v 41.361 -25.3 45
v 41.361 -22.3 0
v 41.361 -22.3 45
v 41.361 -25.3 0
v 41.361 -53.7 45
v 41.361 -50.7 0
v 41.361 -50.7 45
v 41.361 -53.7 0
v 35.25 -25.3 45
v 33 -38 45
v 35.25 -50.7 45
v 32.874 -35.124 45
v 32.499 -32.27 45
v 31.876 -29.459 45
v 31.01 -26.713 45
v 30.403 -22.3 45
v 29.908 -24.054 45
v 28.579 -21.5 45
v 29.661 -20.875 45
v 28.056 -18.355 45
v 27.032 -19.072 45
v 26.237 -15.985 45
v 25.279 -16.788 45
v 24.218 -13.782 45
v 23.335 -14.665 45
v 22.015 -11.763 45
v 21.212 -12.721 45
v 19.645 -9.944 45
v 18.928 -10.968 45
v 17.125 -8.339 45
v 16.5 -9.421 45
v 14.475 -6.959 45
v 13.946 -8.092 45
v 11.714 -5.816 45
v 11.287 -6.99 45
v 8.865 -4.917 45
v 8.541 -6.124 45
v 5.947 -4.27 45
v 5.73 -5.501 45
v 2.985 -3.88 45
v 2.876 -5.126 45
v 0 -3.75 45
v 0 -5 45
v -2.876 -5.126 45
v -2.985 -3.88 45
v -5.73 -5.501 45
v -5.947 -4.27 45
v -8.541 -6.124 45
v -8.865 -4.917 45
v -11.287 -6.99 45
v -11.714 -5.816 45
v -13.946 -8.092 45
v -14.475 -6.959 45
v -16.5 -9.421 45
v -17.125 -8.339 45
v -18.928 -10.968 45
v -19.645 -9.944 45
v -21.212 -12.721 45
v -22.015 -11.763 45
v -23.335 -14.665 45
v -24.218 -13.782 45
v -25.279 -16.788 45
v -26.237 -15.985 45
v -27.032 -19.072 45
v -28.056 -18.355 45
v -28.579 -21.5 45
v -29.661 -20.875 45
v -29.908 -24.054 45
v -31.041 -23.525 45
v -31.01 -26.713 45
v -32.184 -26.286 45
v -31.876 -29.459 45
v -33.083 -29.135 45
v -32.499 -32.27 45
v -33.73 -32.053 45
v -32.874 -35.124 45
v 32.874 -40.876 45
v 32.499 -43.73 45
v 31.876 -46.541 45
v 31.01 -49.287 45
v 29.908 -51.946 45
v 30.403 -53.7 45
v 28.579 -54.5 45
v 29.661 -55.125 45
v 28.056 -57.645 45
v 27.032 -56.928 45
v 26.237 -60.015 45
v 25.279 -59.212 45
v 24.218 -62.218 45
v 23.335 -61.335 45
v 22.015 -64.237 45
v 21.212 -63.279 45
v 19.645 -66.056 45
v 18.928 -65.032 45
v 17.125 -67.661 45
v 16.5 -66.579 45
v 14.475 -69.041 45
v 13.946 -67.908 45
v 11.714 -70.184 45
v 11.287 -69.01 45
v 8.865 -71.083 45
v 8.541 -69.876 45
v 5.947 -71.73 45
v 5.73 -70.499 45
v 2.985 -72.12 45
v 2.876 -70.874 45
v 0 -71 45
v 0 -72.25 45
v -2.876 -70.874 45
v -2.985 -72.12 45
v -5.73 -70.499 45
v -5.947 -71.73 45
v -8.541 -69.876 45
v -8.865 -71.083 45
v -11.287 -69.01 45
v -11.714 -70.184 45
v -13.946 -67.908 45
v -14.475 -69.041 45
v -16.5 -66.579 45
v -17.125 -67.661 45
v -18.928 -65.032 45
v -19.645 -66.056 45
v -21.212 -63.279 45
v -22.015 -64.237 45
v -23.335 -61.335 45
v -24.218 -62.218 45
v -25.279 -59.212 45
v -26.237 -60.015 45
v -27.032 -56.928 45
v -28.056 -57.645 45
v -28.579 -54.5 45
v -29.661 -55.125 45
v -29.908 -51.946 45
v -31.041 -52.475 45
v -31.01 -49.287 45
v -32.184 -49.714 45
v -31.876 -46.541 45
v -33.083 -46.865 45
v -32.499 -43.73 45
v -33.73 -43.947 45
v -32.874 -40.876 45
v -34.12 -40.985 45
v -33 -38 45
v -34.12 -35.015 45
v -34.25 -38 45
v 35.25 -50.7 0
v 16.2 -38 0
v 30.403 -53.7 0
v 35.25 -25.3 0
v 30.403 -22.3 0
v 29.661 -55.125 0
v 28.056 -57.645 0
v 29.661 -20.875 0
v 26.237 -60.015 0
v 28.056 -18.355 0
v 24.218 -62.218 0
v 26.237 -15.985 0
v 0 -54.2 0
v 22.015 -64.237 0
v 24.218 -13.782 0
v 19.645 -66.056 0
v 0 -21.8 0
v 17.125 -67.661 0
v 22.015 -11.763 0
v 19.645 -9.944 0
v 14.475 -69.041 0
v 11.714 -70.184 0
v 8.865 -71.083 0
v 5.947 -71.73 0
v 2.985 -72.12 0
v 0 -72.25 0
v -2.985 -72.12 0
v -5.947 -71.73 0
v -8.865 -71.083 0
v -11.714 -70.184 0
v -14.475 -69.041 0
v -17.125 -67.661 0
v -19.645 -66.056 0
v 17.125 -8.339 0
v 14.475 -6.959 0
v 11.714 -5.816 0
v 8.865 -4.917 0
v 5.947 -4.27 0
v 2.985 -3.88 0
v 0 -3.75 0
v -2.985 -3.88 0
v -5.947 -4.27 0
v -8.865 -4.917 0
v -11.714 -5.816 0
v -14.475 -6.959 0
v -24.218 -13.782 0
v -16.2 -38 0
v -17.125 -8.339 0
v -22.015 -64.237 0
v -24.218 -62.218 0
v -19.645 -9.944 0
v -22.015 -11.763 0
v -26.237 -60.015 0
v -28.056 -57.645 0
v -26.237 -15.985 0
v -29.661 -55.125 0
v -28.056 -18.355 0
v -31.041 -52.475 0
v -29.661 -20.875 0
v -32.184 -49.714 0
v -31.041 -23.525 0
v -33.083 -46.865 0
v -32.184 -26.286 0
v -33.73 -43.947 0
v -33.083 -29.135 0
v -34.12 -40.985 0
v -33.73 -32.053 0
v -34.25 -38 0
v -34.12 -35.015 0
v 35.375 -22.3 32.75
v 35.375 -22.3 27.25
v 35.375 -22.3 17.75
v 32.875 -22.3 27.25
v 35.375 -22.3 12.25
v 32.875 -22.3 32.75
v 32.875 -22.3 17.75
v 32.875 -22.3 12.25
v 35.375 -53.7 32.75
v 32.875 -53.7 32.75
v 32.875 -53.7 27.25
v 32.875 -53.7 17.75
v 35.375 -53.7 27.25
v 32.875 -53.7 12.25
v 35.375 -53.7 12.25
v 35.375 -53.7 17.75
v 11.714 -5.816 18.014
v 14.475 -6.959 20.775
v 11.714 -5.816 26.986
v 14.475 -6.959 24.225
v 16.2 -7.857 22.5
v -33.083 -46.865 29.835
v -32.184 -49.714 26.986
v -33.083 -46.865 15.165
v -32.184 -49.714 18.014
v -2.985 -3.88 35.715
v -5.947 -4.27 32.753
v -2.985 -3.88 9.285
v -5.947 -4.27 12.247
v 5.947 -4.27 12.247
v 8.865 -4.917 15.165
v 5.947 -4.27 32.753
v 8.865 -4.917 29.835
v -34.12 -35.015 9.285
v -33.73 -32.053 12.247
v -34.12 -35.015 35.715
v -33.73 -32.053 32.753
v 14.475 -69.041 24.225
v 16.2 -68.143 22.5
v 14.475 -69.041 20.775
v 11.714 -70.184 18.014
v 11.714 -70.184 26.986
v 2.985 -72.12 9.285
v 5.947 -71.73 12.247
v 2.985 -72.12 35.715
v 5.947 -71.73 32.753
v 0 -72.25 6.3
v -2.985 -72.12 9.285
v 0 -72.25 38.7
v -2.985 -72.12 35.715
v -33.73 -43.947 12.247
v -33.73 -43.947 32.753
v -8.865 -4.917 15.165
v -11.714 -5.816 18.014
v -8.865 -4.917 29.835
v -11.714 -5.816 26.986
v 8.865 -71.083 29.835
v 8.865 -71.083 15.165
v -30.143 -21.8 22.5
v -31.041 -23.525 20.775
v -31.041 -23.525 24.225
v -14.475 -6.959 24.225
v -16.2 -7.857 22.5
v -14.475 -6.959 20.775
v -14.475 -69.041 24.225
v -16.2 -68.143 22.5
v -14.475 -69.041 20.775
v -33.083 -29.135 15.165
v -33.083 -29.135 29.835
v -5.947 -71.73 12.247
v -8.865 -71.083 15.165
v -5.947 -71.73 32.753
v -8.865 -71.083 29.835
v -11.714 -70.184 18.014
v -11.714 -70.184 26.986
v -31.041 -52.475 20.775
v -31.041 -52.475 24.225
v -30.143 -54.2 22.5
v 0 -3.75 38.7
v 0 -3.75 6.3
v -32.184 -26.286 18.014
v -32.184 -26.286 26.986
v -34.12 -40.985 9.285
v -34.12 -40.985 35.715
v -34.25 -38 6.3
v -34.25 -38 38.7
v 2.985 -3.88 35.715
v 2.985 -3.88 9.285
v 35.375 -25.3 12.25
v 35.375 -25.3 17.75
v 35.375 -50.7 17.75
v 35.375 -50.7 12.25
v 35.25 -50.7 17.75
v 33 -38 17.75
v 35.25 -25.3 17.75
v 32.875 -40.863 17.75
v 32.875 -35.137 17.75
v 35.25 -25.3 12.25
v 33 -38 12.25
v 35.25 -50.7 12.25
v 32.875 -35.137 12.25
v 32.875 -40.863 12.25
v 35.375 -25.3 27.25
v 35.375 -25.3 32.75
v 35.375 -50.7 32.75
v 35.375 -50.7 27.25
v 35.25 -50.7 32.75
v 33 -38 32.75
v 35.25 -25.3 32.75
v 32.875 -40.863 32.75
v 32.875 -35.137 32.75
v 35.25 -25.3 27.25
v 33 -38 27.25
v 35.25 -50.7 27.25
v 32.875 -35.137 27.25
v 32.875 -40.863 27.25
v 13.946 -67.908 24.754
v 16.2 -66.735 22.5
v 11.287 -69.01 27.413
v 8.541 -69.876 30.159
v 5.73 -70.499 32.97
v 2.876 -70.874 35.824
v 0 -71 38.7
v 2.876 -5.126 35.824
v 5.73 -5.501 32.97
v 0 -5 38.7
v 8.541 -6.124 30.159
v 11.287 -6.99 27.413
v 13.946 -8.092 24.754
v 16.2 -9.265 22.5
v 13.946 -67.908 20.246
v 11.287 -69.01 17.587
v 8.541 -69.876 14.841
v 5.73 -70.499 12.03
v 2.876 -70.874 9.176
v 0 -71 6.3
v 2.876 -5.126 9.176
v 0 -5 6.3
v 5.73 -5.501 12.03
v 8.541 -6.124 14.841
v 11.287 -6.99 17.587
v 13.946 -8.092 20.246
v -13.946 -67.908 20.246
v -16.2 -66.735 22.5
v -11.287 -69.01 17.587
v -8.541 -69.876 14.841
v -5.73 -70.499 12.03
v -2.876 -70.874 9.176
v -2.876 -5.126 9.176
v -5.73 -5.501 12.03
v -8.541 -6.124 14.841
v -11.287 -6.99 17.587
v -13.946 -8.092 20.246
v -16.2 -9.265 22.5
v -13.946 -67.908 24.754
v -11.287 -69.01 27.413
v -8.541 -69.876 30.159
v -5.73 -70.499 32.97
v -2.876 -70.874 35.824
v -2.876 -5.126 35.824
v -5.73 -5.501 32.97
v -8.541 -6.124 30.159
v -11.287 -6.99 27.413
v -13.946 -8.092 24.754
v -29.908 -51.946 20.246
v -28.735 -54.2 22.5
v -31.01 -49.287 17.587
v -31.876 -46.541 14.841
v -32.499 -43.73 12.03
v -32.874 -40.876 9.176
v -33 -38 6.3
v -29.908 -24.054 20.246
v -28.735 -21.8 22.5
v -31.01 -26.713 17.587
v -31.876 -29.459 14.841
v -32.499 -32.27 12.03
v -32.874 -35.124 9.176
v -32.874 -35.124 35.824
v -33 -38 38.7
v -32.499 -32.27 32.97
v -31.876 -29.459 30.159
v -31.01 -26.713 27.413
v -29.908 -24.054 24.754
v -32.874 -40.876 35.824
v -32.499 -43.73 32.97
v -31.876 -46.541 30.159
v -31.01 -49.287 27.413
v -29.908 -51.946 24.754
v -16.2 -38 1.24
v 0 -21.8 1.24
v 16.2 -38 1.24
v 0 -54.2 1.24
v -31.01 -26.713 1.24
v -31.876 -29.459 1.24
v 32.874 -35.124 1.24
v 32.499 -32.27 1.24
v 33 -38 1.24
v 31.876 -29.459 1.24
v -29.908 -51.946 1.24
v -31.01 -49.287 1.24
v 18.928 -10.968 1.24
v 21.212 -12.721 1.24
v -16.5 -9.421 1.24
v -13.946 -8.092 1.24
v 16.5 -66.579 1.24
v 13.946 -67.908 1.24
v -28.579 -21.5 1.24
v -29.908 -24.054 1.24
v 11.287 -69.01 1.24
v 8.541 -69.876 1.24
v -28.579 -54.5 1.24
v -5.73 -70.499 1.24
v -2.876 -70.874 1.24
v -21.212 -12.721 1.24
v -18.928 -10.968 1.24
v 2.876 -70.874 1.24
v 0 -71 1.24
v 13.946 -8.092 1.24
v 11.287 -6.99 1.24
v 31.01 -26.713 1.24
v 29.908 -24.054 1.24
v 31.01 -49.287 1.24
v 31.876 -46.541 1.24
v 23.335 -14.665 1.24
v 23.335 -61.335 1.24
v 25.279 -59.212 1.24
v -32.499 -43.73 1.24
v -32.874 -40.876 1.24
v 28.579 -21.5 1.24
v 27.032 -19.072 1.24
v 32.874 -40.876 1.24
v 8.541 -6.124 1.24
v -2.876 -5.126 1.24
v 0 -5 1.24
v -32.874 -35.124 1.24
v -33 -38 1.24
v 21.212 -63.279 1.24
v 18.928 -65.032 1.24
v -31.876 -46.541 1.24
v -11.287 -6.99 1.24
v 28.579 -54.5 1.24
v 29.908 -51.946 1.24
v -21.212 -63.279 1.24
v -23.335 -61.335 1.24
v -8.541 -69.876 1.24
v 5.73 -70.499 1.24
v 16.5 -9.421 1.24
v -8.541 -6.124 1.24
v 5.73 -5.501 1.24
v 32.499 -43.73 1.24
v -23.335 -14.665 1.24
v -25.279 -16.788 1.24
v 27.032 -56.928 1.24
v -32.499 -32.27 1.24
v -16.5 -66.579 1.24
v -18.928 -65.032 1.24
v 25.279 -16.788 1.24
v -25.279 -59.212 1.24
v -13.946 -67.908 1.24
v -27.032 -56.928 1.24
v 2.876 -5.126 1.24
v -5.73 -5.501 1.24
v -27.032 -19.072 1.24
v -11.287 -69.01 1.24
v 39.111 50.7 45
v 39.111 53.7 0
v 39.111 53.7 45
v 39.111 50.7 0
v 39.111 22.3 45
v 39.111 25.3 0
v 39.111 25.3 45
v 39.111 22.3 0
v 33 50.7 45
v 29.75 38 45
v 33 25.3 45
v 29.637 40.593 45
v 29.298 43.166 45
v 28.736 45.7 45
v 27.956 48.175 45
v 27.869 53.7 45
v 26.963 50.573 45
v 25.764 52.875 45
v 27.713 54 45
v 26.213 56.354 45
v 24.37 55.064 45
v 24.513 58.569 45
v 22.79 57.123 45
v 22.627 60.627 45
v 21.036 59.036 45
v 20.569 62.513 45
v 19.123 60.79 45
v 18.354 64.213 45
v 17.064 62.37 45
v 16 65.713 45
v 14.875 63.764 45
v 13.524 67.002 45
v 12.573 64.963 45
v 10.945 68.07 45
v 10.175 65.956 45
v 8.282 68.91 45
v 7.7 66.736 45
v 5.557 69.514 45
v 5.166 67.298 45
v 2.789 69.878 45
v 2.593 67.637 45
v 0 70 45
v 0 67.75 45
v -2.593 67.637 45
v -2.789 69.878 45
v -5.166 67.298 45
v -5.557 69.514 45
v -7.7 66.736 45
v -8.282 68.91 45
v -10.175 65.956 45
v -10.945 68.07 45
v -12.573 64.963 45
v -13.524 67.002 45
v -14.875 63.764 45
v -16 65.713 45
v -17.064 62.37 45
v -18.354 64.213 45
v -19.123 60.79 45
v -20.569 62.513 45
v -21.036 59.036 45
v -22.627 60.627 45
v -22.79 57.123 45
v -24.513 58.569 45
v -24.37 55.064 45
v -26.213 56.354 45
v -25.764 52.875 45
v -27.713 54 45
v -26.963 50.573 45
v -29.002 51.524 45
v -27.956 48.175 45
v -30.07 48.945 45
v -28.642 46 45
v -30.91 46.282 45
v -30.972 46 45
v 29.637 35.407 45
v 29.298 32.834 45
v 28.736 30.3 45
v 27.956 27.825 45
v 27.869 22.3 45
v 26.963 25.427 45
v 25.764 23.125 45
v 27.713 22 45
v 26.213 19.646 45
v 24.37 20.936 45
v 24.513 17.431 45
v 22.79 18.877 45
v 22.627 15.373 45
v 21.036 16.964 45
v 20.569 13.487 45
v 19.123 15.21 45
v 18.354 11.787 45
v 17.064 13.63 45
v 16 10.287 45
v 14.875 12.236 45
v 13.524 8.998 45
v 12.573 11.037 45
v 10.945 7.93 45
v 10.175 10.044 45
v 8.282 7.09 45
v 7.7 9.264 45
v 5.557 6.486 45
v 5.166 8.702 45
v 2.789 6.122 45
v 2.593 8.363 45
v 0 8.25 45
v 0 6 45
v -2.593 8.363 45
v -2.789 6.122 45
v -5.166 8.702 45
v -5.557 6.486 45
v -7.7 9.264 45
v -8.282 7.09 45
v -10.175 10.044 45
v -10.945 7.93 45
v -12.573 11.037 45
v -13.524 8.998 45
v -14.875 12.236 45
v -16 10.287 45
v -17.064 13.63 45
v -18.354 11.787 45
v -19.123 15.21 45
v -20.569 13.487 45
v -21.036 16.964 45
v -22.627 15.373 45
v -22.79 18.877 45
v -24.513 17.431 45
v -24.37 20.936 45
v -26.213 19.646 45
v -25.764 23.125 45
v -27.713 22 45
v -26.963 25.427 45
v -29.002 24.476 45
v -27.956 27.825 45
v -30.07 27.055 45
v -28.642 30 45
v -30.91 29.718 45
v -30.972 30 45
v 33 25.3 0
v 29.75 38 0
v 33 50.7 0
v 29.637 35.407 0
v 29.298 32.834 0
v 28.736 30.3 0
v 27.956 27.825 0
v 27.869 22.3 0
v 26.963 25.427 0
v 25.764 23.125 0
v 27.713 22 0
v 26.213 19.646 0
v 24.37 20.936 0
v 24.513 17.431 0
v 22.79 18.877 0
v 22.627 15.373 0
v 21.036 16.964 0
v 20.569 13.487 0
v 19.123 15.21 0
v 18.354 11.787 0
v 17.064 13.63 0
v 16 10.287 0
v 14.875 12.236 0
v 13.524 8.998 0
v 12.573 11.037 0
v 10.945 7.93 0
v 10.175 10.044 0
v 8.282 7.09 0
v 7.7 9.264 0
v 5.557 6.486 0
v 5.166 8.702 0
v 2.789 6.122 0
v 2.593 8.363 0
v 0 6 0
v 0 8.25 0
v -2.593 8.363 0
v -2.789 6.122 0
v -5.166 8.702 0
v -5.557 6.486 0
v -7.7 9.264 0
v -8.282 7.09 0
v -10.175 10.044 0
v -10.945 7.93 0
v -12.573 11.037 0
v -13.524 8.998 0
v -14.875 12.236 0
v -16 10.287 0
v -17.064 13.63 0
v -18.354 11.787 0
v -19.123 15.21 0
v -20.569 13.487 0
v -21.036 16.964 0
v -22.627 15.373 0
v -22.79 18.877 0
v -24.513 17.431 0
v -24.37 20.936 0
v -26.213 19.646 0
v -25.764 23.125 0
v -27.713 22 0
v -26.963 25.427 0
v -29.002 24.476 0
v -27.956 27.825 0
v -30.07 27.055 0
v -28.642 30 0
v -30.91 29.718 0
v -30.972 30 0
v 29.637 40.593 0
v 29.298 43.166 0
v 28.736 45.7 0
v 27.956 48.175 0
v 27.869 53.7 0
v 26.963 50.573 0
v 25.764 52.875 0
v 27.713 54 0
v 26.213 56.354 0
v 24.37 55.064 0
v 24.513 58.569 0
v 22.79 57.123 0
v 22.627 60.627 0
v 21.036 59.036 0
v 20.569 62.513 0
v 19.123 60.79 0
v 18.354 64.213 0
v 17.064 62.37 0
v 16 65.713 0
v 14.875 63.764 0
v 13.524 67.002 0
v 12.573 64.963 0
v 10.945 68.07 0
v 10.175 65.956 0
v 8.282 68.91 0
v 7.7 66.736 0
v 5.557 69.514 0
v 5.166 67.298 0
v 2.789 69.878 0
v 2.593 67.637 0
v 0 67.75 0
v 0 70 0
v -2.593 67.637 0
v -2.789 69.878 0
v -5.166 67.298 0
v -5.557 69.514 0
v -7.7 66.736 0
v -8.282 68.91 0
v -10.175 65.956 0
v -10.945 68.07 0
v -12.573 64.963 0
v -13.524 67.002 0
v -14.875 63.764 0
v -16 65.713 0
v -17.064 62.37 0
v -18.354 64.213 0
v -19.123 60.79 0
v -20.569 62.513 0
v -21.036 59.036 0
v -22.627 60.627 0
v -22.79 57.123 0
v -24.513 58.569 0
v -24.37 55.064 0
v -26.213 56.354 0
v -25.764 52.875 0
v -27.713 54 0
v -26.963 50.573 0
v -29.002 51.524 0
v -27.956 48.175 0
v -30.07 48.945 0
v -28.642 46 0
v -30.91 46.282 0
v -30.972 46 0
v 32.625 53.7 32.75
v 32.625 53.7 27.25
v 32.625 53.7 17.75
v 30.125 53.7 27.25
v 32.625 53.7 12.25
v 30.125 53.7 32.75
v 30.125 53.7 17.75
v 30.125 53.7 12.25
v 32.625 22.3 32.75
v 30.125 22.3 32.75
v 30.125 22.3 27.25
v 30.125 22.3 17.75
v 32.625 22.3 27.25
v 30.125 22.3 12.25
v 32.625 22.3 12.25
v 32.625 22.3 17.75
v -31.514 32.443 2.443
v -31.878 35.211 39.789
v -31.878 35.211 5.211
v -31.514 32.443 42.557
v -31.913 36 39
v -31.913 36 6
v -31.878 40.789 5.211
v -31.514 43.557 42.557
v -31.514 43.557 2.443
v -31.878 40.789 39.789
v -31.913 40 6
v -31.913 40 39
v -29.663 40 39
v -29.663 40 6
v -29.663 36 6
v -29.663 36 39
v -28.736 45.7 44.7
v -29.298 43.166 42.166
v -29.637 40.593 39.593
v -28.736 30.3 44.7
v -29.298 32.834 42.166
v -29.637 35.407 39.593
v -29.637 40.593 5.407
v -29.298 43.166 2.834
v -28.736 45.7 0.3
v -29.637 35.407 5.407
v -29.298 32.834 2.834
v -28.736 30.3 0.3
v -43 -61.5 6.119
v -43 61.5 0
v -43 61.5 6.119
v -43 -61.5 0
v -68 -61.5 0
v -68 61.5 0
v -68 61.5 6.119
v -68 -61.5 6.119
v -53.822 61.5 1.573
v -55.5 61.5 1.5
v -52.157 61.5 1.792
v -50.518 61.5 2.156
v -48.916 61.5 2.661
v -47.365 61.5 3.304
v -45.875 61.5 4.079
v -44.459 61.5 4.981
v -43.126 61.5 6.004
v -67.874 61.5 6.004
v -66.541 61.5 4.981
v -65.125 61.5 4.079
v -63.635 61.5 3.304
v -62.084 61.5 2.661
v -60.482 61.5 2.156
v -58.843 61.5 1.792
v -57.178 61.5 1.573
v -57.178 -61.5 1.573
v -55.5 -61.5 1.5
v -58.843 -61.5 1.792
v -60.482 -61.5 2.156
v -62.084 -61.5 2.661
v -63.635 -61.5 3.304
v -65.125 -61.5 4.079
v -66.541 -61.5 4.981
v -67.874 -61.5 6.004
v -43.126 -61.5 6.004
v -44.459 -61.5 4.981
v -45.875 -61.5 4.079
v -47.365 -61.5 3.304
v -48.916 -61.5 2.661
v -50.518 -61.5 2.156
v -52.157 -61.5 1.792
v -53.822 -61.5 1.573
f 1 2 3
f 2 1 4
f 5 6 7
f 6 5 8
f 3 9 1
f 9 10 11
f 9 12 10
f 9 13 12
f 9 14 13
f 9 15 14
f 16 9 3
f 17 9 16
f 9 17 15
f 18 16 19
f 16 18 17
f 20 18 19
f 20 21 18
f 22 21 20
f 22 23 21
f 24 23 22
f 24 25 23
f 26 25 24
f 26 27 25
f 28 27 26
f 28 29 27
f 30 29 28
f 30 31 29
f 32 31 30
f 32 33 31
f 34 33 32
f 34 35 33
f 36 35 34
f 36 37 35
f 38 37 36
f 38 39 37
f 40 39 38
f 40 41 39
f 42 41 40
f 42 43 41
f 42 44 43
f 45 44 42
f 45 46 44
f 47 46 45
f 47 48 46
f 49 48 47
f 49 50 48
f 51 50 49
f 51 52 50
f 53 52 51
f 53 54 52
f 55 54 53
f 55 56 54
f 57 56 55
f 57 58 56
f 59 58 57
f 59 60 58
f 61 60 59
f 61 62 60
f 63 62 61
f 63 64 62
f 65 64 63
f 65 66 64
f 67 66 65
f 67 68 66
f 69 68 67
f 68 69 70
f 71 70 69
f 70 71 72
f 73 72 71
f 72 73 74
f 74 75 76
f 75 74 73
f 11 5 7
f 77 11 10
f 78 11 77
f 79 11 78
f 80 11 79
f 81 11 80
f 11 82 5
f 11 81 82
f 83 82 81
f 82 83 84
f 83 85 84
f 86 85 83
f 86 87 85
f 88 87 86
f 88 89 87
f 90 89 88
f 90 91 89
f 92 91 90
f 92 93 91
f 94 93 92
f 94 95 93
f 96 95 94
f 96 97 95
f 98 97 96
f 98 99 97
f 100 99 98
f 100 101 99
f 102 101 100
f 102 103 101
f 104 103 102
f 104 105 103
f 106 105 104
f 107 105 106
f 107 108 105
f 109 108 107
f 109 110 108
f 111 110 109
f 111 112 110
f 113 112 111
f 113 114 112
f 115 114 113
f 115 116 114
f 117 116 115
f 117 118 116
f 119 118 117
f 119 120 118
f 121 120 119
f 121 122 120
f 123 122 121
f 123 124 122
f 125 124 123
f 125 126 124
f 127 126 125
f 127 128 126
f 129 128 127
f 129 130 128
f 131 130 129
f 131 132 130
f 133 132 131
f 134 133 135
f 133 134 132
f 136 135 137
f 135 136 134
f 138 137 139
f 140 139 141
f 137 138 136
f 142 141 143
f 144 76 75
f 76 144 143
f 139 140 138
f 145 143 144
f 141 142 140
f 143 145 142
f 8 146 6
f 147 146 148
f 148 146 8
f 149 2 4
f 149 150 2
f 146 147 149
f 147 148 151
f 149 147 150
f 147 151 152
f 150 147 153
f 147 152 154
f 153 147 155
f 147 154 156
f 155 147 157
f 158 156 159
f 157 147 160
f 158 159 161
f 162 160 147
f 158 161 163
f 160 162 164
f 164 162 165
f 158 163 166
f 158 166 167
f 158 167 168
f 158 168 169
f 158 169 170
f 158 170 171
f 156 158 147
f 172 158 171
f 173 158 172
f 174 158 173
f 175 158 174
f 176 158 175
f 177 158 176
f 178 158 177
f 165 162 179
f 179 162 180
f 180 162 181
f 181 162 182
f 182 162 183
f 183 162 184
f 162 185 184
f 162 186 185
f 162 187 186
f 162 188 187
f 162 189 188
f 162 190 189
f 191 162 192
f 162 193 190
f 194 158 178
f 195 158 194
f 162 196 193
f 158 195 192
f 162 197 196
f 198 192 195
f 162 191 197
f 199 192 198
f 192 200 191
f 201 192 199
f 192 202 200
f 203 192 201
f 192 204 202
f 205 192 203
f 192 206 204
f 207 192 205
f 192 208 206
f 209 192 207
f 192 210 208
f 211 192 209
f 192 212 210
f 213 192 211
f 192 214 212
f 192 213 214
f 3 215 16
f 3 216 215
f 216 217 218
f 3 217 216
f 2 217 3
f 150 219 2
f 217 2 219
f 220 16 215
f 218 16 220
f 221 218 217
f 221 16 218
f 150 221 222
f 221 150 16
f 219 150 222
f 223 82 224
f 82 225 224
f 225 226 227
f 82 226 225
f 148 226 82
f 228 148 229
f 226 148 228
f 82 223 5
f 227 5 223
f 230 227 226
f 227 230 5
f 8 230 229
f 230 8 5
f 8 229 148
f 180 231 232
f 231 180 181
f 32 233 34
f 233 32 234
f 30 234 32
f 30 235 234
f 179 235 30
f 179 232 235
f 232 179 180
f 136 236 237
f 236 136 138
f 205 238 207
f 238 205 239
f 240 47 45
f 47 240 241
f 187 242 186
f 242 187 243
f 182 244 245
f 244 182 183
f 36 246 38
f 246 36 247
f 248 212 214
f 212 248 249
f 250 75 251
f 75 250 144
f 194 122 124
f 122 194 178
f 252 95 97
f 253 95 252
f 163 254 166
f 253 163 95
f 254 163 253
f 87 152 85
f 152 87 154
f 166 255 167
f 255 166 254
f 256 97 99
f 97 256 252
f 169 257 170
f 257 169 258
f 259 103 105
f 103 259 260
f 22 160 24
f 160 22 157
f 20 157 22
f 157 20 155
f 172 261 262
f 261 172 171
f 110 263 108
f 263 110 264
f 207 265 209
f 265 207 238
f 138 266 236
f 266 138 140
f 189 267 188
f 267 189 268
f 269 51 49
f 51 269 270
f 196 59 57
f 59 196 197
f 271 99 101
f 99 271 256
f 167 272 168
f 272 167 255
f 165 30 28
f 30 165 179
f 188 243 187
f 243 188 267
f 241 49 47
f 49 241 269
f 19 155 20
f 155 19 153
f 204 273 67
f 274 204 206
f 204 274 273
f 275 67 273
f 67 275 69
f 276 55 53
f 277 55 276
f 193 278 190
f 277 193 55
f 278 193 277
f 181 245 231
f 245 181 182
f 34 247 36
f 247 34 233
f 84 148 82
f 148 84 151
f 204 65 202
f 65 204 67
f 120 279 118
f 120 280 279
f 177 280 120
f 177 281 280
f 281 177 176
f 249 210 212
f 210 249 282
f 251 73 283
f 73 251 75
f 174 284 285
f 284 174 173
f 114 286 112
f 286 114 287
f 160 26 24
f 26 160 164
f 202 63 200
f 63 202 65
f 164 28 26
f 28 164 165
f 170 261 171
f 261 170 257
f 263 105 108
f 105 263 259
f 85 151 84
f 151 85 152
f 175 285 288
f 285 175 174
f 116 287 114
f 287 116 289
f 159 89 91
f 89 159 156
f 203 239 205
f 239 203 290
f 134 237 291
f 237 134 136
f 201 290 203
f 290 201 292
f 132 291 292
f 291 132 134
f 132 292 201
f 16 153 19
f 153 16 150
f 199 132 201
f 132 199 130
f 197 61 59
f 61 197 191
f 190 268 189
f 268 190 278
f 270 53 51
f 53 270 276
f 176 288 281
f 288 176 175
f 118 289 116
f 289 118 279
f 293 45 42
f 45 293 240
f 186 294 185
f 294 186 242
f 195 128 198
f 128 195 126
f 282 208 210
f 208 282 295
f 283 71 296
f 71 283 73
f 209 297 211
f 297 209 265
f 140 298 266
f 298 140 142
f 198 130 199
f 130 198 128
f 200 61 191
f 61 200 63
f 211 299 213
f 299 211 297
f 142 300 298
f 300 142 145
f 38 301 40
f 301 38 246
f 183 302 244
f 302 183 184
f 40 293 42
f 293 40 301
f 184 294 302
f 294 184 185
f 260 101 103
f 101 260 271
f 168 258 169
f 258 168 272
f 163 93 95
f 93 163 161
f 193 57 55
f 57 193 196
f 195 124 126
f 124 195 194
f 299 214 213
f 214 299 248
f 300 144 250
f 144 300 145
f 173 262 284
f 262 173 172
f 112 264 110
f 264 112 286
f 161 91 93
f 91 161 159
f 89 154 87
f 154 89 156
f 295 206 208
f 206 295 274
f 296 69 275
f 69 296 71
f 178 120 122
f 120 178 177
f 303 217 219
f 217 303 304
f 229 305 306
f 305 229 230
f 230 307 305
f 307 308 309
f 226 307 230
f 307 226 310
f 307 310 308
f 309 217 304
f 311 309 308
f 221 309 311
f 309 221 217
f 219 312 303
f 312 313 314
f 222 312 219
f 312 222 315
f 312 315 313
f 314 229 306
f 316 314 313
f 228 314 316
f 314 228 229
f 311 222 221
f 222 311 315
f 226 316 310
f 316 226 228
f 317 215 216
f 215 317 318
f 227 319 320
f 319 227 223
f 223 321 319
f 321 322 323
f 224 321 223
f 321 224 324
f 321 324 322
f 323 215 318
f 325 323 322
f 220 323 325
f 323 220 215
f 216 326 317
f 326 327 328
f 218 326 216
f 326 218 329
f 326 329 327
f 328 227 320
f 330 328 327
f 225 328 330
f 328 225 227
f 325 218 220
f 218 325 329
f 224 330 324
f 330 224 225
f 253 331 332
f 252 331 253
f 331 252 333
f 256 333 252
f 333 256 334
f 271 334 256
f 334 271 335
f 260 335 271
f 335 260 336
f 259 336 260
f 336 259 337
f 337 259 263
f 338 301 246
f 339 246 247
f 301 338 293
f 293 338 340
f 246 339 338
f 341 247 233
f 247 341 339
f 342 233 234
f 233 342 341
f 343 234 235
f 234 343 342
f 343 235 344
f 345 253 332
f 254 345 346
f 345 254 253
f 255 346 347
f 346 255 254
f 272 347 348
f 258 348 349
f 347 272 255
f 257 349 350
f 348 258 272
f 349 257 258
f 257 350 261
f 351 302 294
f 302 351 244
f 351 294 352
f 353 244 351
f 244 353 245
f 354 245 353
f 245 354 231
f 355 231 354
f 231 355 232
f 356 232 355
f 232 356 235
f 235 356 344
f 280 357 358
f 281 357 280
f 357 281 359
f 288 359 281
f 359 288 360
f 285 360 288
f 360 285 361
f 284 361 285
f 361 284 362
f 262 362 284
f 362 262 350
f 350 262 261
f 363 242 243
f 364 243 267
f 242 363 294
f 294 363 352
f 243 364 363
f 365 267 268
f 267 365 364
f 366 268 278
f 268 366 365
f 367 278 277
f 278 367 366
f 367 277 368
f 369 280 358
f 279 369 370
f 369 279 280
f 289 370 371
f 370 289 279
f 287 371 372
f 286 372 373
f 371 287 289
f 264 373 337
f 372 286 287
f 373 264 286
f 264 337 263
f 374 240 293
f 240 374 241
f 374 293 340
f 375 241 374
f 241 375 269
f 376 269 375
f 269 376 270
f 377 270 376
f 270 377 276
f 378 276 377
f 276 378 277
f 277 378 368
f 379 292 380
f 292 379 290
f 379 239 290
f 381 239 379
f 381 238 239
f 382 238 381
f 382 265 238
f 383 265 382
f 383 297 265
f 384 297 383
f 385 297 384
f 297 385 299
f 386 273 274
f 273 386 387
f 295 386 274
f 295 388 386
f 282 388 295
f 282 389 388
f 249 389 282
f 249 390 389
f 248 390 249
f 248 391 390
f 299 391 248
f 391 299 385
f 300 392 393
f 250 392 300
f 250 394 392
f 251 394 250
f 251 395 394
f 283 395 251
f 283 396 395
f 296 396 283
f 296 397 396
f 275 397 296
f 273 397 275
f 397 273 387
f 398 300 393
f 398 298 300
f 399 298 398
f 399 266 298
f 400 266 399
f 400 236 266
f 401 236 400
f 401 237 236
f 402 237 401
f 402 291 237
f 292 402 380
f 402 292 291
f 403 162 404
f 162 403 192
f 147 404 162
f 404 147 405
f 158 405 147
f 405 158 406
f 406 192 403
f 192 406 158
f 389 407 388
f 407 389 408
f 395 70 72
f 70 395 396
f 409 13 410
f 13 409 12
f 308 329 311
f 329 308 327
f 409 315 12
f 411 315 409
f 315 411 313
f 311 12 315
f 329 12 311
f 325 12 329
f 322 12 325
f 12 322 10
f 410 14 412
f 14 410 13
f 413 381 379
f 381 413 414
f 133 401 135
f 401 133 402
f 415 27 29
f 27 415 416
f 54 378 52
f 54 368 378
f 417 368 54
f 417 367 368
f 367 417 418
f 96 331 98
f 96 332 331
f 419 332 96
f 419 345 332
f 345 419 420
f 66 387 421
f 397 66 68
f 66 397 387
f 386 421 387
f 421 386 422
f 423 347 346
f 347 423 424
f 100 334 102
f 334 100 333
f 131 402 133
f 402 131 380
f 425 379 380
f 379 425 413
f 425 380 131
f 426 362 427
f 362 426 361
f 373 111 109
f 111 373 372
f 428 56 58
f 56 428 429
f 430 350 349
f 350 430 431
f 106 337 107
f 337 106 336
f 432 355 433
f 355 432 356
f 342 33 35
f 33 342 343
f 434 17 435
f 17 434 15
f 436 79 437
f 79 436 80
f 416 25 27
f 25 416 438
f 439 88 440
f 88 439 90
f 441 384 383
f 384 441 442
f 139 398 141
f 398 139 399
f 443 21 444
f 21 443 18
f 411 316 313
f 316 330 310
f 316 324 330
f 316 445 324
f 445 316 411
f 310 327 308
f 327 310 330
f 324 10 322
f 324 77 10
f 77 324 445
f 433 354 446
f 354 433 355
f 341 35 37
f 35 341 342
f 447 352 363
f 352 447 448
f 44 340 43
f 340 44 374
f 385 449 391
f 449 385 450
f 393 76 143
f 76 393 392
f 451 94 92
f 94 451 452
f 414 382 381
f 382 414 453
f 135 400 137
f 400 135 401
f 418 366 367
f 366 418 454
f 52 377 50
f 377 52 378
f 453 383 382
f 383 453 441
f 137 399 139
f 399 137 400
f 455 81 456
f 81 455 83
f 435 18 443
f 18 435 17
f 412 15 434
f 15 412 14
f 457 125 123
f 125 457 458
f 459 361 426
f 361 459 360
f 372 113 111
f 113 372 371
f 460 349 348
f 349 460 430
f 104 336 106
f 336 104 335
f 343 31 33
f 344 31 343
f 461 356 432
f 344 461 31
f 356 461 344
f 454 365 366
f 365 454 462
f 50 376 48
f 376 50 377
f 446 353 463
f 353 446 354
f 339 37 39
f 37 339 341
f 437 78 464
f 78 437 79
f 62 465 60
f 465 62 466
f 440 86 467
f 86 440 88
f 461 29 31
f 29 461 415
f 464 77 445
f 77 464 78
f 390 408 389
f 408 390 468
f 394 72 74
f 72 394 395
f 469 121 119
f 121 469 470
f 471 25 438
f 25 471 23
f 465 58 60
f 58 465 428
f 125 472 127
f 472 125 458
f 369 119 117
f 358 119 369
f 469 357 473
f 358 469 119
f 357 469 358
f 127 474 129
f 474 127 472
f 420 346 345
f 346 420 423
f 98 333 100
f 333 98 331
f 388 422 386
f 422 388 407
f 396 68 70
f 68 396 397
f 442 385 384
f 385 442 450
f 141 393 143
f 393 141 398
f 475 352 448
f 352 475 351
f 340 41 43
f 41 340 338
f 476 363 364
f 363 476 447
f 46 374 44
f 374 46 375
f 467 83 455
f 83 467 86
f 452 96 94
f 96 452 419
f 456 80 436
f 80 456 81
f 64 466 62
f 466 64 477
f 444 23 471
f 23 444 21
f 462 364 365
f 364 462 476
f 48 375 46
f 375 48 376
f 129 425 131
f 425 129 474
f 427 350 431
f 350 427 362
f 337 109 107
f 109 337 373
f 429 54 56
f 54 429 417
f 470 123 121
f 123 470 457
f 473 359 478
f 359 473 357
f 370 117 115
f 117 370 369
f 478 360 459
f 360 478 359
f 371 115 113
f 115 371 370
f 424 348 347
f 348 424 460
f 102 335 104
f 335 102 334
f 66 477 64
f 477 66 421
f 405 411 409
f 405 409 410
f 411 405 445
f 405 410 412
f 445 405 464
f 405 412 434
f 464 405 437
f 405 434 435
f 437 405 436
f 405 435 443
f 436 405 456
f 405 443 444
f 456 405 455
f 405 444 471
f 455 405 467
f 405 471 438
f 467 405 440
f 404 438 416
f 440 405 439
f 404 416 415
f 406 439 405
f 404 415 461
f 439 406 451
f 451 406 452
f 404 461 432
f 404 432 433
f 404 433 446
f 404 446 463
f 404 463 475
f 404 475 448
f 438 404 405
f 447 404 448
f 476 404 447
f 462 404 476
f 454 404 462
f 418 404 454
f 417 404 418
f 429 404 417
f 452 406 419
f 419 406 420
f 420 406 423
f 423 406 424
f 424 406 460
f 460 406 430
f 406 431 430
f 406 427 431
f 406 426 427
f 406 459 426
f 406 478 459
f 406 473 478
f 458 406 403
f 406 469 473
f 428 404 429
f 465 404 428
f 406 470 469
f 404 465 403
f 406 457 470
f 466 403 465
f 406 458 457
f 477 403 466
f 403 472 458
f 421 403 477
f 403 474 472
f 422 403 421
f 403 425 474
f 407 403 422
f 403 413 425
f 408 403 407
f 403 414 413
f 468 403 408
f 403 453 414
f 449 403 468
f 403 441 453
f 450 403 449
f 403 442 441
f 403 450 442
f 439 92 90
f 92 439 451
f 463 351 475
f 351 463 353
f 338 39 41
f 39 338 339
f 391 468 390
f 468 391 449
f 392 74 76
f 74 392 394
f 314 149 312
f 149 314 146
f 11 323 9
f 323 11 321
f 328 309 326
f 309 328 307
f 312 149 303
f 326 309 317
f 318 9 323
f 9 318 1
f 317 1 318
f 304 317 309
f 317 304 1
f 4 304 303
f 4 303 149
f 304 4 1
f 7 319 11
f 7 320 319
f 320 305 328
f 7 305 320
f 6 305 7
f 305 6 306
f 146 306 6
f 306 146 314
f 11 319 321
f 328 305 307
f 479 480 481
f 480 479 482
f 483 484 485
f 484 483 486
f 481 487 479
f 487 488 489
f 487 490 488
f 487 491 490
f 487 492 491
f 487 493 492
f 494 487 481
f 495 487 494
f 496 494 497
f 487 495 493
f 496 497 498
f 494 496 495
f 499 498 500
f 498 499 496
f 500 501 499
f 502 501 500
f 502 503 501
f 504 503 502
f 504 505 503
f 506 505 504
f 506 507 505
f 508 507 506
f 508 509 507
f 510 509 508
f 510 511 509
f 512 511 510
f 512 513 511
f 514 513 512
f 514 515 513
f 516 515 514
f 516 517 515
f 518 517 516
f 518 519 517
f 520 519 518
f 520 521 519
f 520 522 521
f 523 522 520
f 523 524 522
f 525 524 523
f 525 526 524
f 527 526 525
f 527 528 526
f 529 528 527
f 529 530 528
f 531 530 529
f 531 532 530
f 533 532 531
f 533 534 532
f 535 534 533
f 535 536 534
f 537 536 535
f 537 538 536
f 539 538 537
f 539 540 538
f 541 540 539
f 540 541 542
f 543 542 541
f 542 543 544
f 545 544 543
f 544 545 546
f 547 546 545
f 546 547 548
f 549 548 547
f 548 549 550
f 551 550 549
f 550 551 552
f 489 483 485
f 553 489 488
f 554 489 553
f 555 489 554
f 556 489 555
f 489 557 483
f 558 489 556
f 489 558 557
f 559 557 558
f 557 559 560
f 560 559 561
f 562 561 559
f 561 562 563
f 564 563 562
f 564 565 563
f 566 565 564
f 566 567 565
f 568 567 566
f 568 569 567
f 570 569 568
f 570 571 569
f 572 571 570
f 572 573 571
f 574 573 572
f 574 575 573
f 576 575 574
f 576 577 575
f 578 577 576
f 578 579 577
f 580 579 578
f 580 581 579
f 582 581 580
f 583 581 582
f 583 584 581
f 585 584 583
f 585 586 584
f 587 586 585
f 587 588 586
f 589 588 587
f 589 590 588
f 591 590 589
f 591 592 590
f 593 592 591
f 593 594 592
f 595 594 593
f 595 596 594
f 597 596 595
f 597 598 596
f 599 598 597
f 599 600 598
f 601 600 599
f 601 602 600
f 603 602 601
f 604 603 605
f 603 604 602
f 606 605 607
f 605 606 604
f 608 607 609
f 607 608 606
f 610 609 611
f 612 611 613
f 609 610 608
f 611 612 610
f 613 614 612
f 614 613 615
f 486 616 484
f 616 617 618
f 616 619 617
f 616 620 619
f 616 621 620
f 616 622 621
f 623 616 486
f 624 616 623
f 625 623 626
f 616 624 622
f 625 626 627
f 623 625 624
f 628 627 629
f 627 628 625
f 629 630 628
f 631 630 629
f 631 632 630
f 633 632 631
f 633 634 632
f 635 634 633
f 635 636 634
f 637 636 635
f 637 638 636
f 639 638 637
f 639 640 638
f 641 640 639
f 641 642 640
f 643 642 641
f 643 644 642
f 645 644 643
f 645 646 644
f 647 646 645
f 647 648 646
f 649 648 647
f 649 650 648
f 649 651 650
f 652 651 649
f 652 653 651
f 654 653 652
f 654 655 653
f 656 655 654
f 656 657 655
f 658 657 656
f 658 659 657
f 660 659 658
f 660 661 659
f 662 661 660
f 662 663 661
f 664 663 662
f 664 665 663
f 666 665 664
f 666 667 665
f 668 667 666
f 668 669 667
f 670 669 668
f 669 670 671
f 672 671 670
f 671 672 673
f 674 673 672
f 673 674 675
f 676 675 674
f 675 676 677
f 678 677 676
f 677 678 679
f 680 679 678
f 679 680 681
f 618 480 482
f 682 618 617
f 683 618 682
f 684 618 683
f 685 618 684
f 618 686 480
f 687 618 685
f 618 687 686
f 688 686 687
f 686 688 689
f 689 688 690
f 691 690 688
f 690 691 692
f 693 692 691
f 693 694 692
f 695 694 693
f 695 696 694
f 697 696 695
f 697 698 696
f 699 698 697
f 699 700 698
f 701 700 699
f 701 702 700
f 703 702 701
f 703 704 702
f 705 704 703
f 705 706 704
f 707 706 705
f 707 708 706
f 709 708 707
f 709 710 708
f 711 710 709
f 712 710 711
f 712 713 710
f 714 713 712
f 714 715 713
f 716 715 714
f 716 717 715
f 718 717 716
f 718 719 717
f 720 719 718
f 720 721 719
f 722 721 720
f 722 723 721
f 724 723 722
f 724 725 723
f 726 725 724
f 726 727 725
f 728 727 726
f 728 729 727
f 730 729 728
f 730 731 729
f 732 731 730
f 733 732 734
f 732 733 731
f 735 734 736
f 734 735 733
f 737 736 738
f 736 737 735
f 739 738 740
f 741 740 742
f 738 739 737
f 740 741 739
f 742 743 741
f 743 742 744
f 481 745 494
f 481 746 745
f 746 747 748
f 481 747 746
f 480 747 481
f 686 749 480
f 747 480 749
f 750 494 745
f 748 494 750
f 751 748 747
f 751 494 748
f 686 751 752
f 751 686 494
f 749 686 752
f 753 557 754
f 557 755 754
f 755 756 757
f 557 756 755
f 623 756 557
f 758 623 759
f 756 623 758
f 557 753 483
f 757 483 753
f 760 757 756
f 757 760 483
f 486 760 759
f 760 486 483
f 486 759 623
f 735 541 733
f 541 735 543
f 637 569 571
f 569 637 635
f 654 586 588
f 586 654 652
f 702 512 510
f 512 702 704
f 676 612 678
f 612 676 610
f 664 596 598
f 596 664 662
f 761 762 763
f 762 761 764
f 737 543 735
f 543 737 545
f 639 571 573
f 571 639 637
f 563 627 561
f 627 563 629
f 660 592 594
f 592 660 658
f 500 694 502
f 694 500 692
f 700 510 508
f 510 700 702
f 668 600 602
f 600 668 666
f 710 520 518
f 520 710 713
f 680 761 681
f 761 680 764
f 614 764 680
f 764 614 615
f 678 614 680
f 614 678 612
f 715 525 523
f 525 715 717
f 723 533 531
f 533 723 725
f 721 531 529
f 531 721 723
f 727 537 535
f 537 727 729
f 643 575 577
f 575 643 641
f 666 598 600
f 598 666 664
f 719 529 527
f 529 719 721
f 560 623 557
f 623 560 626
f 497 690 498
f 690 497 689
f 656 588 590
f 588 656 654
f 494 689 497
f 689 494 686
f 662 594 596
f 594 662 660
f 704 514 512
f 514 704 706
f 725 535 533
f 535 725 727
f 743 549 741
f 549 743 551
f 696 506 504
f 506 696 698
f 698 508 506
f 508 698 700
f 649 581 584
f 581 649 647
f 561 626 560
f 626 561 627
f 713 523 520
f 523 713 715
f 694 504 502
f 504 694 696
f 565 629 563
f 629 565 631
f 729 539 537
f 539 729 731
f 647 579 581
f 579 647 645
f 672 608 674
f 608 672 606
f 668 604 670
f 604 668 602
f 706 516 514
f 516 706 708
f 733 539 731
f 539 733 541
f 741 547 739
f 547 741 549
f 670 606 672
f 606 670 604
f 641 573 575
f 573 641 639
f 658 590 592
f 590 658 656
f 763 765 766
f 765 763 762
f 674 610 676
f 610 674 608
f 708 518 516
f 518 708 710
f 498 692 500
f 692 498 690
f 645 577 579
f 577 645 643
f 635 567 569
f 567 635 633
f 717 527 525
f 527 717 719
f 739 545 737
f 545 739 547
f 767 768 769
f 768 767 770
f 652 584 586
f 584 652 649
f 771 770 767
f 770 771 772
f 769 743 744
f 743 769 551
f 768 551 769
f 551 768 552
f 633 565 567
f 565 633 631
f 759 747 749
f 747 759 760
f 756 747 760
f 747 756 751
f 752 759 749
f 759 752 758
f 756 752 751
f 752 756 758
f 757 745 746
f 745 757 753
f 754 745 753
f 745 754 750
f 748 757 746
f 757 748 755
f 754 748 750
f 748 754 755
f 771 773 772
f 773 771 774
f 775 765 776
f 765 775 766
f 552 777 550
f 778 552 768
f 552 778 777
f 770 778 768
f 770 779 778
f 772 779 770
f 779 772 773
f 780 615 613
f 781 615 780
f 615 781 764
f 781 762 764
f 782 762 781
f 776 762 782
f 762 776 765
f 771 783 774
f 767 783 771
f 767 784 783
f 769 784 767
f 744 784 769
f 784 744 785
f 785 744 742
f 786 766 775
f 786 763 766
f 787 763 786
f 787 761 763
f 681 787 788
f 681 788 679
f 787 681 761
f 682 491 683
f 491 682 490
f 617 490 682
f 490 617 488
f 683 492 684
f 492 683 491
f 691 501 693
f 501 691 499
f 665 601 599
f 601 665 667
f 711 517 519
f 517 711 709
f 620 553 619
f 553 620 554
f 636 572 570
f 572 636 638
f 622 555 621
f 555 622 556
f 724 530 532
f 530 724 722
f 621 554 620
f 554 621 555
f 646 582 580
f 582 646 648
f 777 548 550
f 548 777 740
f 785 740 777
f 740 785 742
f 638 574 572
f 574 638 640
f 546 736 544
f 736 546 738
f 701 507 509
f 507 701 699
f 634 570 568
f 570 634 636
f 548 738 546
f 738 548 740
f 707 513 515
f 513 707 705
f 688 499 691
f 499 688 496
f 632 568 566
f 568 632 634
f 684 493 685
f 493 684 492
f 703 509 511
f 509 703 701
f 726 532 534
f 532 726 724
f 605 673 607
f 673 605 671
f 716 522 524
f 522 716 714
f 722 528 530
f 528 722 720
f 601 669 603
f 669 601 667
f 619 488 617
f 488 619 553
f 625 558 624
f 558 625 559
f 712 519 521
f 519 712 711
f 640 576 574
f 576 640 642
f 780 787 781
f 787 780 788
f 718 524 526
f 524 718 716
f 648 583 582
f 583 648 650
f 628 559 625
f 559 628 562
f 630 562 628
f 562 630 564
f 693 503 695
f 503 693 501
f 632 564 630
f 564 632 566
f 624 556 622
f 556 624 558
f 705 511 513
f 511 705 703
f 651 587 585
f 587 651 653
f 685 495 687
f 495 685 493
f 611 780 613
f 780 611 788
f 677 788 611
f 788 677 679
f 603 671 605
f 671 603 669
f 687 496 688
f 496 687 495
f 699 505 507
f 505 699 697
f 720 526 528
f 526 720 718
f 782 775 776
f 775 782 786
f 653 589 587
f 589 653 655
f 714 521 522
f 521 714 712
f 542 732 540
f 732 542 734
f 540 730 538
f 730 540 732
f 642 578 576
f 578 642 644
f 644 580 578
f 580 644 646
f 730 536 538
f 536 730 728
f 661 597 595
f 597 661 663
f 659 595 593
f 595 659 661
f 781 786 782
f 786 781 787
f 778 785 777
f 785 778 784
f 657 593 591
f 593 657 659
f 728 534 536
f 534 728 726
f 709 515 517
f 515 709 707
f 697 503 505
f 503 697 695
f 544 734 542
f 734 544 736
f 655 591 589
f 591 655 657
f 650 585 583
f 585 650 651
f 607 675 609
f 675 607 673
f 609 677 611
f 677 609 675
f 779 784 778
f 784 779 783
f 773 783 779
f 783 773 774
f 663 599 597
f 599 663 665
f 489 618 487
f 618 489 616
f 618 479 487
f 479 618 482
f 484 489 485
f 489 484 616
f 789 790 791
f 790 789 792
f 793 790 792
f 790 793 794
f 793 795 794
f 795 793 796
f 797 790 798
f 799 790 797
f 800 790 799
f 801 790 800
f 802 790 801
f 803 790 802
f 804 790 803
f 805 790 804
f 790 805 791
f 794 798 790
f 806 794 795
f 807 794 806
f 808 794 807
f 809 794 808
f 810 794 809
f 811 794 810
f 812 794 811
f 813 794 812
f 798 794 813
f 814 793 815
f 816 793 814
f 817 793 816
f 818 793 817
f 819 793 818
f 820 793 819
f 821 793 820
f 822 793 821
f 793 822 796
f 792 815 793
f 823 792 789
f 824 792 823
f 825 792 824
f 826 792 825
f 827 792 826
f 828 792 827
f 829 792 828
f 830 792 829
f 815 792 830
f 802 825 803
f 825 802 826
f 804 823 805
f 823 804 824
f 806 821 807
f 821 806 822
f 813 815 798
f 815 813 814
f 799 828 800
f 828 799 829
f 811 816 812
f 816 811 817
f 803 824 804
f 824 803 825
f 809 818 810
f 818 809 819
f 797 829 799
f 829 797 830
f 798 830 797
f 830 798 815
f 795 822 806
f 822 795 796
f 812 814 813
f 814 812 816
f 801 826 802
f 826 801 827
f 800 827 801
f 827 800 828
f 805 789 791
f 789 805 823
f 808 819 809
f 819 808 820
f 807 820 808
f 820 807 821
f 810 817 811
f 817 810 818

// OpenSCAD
output = 0; // [0:Everything, 1:Bottom holder, 2:Top holder, 3:Joining strip]
joiningStripWidth = 25; 
joiningStripMinimumThickness = 1.5;
joiningStripHeight = 123; 
bottleDiameter = 66; 
bottomWallThickness = 1.25;
bottomHolderHeight = 45; 
topWallThickness = 2.25; 
topHolderHeight = 45; 
topHolderCinch = 6.5;
topSlit = 4;
bikeTubeDiameter =  38.5; 
zipTieHoleHeight = 5.5;
zipTieHoleWidth = 2.5;
joiningStripHolderWidth = 3;
joiningStripHolderExtraThickness = 1;
tolerance = 0.2;
plasticSavingHoleHeightRatio = 0.72;

module dummy() {}

nudge = 0.01;
$fn = 72;

joiningStripMaximumThickness = joiningStripMinimumThickness + bikeTubeDiameter/2 - sqrt(pow(bikeTubeDiameter/2,2)-pow(joiningStripWidth/2,2));

module joiningStrip() {
    difference() {
        translate([-joiningStripWidth/2,0,0]) cube([joiningStripWidth,joiningStripHeight,joiningStripMinimumThickness+bikeTubeDiameter*0.49]);
        translate([0,0,bikeTubeDiameter/2+joiningStripMinimumThickness]) rotate([90,0,0]) cylinder(d=bikeTubeDiameter,h=joiningStripHeight*3,center=true);
    }
        
}

module holder(bottleDiameter,wallThickness,height,baseThickness) {
    od = bottleDiameter+wallThickness*2;
    id = bottleDiameter;
    t = joiningStripMaximumThickness+joiningStripHolderExtraThickness;
    s = plasticSavingHoleHeightRatio * min(id,height);
    difference() {
        union() {
            translate([0,-joiningStripWidth/2-tolerance-joiningStripHolderWidth,0]) cube([od/2+t,joiningStripWidth+2*tolerance+joiningStripHolderWidth*2,height]);
            cylinder(h=height,d=od);
        }
        translate([0,0,baseThickness-nudge]) cylinder(h=height+2*nudge,d=id);
     translate([od/2+joiningStripHolderExtraThickness,-joiningStripWidth/2-tolerance,-nudge]) cube([t+nudge,joiningStripWidth+2*tolerance,height+2*nudge]);
        for (z=[height/3,height*2/3]) {
            translate([(id/2+(od/2+joiningStripHolderExtraThickness))/2-zipTieHoleWidth/2,-od/2,z-zipTieHoleHeight/2]) cube([zipTieHoleWidth,od,zipTieHoleHeight]);
        }
        if (baseThickness > 0) {
            translate([0,0,height/2]) rotate([90,0,0]) cylinder(d=s,h=2*od,$fn=4,center=true);
            translate([0,0,height/2]) rotate([0,-90,0]) cylinder(d=s,h=od,$fn=4);
            cylinder(d=s,h=height*2,$fn=4,center=true);
        }
        else {
            if (topSlit > 0)
            translate([-od/2-nudge,-topSlit/2,-nudge]) cube([od/2,topSlit,height+2*nudge]);
            translate([0,0,height]) rotate([0,-90,0]) cylinder(d=topSlit*4,h=od,$fn=4);
            rotate([0,-90,0]) cylinder(d=topSlit*4,h=od,$fn=4);
        }
    }
}

render(convexity=2)
if (output == 0) {
    translate([0,-(5+bottleDiameter/2),0]) holder(bottleDiameter,bottomWallThickness,bottomHolderHeight,bottomWallThickness);
    translate([0,5+bottleDiameter/2,0]) holder(bottleDiameter-topHolderCinch,topWallThickness,topHolderHeight,0);
    translate([-bottleDiameter/2-10-joiningStripWidth/2,-joiningStripHeight/2,0]) joiningStrip();
}
else if (output == 1) {
    holder(bottleDiameter,bottomWallThickness,bottomHolderHeight,bottomWallThickness);
}
else if (output == 2) {
    holder(bottleDiameter-topHolderCinch,topWallThickness,topHolderHeight,0);
}
else if (output == 3) {
    rotate([0,0,-45]) joiningStrip();
}
